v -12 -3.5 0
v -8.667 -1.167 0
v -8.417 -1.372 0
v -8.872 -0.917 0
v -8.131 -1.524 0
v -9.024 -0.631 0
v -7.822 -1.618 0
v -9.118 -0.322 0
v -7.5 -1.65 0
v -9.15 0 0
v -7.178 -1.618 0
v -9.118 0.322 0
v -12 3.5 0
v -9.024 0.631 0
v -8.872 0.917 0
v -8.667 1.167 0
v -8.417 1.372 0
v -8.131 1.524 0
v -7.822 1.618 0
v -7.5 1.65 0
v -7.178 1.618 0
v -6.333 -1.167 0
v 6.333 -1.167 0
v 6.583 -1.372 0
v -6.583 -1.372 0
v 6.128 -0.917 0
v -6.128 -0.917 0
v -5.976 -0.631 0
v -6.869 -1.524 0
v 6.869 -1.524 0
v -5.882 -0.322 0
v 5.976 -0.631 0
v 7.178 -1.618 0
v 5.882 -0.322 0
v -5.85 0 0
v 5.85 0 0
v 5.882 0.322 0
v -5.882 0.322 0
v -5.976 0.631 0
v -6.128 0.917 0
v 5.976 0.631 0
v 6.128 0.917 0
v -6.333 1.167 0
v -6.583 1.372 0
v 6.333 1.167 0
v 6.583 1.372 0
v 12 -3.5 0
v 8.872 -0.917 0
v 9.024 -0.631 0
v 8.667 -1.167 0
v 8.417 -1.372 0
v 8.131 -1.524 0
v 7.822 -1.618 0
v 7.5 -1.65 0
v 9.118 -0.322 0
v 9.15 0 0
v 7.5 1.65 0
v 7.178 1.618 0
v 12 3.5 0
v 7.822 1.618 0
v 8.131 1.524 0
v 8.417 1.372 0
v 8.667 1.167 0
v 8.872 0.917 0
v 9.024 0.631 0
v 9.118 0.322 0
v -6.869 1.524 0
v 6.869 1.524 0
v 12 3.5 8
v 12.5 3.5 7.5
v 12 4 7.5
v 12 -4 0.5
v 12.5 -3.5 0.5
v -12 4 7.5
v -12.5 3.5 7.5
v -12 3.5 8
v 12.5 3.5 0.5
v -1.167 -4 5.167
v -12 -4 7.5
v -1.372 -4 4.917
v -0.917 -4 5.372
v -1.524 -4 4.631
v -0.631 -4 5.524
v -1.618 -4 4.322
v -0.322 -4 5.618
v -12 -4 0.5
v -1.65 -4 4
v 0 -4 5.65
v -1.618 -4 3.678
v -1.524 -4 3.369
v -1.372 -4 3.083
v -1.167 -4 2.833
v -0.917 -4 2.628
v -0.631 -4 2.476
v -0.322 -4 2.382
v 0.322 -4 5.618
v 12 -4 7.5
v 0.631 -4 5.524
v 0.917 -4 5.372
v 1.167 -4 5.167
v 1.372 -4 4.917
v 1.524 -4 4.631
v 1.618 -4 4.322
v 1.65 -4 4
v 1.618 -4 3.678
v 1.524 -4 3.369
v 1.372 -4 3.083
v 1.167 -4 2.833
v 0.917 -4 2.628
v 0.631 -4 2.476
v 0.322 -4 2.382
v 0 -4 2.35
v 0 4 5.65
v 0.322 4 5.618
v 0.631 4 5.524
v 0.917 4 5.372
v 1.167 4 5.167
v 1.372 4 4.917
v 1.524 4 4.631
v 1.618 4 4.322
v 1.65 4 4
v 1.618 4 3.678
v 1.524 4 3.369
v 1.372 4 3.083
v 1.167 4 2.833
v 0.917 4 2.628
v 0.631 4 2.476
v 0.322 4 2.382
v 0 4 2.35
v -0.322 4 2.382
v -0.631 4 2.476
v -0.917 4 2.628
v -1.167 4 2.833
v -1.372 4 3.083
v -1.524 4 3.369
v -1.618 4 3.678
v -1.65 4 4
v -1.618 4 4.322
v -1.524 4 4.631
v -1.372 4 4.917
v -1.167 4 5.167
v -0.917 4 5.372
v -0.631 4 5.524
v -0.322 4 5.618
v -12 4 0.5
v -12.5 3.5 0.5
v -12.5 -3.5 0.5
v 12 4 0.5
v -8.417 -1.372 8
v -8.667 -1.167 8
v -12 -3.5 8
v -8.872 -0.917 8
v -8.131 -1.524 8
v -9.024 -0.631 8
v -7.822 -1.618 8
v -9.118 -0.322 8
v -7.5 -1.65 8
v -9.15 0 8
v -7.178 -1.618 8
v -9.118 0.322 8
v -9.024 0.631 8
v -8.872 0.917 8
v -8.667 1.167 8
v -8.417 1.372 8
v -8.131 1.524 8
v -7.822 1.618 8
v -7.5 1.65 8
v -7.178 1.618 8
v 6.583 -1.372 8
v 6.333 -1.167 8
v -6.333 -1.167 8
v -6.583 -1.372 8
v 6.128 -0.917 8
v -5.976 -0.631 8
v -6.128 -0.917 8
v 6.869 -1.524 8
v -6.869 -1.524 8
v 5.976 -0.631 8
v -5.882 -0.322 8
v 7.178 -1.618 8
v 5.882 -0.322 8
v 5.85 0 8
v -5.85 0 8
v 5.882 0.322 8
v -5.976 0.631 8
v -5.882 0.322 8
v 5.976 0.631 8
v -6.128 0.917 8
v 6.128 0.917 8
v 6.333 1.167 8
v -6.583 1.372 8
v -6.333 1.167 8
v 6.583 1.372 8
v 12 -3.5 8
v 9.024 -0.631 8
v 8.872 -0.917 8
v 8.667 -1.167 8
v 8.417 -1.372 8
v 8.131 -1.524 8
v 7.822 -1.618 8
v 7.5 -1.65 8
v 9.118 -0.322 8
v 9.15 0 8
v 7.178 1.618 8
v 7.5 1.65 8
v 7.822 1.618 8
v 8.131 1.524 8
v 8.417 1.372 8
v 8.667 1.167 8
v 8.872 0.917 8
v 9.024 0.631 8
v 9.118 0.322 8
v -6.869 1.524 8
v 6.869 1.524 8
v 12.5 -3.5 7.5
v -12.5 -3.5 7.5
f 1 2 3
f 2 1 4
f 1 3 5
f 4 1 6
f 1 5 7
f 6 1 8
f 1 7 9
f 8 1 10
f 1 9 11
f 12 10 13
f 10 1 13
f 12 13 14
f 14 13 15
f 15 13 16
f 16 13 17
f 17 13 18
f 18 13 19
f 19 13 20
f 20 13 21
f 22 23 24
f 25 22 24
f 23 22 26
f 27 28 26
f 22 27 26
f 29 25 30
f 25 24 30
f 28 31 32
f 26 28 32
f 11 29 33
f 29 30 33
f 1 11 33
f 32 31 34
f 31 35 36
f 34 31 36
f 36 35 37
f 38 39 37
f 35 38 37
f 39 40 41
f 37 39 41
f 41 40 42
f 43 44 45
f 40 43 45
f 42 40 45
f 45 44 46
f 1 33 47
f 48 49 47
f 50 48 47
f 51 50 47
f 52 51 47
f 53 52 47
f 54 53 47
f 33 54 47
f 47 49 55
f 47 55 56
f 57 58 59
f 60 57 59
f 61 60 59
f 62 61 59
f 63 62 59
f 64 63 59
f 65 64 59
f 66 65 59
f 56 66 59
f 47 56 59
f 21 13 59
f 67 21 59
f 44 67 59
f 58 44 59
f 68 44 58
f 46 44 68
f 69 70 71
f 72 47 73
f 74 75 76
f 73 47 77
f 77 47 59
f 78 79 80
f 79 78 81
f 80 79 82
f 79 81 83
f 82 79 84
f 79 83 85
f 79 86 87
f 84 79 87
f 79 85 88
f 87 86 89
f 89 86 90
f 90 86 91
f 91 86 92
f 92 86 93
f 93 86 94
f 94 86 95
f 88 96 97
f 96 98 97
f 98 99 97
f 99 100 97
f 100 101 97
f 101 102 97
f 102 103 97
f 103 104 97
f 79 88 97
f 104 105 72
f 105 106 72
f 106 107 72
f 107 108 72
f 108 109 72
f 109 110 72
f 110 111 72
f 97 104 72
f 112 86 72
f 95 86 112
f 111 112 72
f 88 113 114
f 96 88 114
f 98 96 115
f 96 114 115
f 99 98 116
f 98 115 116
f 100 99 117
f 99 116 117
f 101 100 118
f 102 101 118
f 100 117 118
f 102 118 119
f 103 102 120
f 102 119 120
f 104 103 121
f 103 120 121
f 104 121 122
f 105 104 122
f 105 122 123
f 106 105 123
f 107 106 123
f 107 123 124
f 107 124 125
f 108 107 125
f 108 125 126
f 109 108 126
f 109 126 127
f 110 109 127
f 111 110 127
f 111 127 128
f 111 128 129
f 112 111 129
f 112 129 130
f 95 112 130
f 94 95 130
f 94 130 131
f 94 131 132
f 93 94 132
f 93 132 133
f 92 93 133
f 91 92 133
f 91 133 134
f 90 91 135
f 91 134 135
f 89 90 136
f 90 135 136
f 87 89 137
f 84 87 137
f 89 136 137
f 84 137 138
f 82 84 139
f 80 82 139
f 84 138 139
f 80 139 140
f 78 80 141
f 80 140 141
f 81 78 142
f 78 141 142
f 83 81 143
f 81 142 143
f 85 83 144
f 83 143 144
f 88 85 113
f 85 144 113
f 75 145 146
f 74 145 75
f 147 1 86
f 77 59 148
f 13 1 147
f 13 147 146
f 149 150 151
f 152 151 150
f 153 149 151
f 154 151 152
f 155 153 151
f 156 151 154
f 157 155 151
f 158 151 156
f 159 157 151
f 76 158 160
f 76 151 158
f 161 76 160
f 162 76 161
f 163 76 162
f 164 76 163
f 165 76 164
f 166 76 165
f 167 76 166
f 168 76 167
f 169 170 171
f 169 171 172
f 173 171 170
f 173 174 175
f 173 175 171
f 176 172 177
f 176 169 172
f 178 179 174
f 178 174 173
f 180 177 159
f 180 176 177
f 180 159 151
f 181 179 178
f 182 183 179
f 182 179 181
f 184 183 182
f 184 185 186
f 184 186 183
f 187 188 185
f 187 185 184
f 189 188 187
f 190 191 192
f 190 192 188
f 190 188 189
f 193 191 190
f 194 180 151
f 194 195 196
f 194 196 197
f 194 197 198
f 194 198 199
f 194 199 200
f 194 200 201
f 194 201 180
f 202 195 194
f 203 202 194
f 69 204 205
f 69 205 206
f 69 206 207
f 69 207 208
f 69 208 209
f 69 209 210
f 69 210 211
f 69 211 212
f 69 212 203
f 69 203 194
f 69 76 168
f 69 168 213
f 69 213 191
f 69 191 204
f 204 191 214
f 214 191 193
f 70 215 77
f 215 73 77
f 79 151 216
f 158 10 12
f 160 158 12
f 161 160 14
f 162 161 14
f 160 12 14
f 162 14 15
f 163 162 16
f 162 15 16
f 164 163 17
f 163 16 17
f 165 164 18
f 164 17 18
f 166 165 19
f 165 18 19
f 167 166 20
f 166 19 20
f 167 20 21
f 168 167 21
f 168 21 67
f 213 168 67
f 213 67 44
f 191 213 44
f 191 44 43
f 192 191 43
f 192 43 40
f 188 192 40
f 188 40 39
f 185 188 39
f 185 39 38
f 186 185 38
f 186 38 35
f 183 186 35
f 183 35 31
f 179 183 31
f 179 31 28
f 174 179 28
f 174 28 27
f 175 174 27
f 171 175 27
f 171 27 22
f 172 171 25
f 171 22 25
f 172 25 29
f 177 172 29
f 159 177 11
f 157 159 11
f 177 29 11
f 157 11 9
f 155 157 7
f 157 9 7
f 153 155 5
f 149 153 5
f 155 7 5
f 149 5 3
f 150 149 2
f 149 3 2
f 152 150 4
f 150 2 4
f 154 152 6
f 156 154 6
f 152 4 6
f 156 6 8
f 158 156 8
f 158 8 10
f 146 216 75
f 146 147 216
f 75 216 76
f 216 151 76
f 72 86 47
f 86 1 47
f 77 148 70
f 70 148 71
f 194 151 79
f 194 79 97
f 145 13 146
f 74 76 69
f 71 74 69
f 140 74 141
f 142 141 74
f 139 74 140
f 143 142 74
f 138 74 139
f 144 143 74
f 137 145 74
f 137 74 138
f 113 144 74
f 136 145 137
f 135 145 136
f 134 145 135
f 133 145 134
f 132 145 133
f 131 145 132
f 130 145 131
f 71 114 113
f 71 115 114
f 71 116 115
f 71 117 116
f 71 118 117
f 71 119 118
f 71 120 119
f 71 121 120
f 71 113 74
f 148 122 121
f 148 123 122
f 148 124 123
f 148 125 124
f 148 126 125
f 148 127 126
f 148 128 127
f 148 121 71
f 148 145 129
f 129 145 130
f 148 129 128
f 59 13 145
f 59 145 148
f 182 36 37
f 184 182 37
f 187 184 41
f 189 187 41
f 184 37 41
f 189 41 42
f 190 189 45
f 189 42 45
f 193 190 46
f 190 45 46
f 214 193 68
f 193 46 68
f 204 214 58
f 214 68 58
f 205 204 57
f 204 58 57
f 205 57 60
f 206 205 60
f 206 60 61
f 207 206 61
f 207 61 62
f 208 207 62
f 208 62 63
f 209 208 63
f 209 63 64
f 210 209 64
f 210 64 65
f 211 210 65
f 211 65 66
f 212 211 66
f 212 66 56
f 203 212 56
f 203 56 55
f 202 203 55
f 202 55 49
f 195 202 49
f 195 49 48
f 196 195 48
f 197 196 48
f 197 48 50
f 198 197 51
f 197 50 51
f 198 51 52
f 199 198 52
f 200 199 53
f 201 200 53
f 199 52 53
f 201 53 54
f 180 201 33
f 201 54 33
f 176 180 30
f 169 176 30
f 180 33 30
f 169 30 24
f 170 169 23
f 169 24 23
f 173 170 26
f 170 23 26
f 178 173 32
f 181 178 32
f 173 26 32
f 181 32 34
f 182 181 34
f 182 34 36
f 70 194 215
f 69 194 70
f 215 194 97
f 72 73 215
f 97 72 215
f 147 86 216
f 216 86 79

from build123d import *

# Parameters (mm, degrees)
SKETCH_1_W         = 25
SKETCH_1_H         = 8
EXTRUDE_1_DEPTH    = 8
CHAMFER_1_SIZE     = 0.5
HOLE_WIZARD_M4_1_D = 3.3
HOLE_WIZARD_M4_2_D = 3.3


with BuildPart() as part:
    # 草图1 → 凸台-拉伸1 (new body)
    with BuildSketch(Plane.XY):
        Rectangle(SKETCH_1_W, SKETCH_1_H)
    extrude(amount=EXTRUDE_1_DEPTH)

    # 倒角1
    chamfer_1_edges = [part.edges().sort_by_distance(p)[0] for p in [
        (-12.5, 0, 8),
        (0, -4, 8),
        (12.5, 0, 8),
        (0, -4, 0),
        (-12.5, 0, 0),
        (0, 4, 0),
        (12.5, 0, 0),
        (12.5, -4, 4),
        (-12.5, -4, 4),
        (-12.5, 4, 4),
        (12.5, 4, 4),
        (0, 4, 8),
    ]]
    chamfer(chamfer_1_edges, length=CHAMFER_1_SIZE)

    # M4 螺纹孔1 (through all)
    with Locations(Plane(origin=(0, -4, 4), x_dir=(0, 0, -1), z_dir=(0, -1, 0))):
        with Locations((0, 0)):
            Hole(HOLE_WIZARD_M4_1_D / 2)

    # M4 螺纹孔2 (through all)
    with Locations(Plane(origin=(-7.5, 0, 8), x_dir=(1, 0, 0), z_dir=(0, 0, 1))):
        with Locations((0, 0), (15, 0)):
            Hole(HOLE_WIZARD_M4_2_D / 2)


solid = part.part
